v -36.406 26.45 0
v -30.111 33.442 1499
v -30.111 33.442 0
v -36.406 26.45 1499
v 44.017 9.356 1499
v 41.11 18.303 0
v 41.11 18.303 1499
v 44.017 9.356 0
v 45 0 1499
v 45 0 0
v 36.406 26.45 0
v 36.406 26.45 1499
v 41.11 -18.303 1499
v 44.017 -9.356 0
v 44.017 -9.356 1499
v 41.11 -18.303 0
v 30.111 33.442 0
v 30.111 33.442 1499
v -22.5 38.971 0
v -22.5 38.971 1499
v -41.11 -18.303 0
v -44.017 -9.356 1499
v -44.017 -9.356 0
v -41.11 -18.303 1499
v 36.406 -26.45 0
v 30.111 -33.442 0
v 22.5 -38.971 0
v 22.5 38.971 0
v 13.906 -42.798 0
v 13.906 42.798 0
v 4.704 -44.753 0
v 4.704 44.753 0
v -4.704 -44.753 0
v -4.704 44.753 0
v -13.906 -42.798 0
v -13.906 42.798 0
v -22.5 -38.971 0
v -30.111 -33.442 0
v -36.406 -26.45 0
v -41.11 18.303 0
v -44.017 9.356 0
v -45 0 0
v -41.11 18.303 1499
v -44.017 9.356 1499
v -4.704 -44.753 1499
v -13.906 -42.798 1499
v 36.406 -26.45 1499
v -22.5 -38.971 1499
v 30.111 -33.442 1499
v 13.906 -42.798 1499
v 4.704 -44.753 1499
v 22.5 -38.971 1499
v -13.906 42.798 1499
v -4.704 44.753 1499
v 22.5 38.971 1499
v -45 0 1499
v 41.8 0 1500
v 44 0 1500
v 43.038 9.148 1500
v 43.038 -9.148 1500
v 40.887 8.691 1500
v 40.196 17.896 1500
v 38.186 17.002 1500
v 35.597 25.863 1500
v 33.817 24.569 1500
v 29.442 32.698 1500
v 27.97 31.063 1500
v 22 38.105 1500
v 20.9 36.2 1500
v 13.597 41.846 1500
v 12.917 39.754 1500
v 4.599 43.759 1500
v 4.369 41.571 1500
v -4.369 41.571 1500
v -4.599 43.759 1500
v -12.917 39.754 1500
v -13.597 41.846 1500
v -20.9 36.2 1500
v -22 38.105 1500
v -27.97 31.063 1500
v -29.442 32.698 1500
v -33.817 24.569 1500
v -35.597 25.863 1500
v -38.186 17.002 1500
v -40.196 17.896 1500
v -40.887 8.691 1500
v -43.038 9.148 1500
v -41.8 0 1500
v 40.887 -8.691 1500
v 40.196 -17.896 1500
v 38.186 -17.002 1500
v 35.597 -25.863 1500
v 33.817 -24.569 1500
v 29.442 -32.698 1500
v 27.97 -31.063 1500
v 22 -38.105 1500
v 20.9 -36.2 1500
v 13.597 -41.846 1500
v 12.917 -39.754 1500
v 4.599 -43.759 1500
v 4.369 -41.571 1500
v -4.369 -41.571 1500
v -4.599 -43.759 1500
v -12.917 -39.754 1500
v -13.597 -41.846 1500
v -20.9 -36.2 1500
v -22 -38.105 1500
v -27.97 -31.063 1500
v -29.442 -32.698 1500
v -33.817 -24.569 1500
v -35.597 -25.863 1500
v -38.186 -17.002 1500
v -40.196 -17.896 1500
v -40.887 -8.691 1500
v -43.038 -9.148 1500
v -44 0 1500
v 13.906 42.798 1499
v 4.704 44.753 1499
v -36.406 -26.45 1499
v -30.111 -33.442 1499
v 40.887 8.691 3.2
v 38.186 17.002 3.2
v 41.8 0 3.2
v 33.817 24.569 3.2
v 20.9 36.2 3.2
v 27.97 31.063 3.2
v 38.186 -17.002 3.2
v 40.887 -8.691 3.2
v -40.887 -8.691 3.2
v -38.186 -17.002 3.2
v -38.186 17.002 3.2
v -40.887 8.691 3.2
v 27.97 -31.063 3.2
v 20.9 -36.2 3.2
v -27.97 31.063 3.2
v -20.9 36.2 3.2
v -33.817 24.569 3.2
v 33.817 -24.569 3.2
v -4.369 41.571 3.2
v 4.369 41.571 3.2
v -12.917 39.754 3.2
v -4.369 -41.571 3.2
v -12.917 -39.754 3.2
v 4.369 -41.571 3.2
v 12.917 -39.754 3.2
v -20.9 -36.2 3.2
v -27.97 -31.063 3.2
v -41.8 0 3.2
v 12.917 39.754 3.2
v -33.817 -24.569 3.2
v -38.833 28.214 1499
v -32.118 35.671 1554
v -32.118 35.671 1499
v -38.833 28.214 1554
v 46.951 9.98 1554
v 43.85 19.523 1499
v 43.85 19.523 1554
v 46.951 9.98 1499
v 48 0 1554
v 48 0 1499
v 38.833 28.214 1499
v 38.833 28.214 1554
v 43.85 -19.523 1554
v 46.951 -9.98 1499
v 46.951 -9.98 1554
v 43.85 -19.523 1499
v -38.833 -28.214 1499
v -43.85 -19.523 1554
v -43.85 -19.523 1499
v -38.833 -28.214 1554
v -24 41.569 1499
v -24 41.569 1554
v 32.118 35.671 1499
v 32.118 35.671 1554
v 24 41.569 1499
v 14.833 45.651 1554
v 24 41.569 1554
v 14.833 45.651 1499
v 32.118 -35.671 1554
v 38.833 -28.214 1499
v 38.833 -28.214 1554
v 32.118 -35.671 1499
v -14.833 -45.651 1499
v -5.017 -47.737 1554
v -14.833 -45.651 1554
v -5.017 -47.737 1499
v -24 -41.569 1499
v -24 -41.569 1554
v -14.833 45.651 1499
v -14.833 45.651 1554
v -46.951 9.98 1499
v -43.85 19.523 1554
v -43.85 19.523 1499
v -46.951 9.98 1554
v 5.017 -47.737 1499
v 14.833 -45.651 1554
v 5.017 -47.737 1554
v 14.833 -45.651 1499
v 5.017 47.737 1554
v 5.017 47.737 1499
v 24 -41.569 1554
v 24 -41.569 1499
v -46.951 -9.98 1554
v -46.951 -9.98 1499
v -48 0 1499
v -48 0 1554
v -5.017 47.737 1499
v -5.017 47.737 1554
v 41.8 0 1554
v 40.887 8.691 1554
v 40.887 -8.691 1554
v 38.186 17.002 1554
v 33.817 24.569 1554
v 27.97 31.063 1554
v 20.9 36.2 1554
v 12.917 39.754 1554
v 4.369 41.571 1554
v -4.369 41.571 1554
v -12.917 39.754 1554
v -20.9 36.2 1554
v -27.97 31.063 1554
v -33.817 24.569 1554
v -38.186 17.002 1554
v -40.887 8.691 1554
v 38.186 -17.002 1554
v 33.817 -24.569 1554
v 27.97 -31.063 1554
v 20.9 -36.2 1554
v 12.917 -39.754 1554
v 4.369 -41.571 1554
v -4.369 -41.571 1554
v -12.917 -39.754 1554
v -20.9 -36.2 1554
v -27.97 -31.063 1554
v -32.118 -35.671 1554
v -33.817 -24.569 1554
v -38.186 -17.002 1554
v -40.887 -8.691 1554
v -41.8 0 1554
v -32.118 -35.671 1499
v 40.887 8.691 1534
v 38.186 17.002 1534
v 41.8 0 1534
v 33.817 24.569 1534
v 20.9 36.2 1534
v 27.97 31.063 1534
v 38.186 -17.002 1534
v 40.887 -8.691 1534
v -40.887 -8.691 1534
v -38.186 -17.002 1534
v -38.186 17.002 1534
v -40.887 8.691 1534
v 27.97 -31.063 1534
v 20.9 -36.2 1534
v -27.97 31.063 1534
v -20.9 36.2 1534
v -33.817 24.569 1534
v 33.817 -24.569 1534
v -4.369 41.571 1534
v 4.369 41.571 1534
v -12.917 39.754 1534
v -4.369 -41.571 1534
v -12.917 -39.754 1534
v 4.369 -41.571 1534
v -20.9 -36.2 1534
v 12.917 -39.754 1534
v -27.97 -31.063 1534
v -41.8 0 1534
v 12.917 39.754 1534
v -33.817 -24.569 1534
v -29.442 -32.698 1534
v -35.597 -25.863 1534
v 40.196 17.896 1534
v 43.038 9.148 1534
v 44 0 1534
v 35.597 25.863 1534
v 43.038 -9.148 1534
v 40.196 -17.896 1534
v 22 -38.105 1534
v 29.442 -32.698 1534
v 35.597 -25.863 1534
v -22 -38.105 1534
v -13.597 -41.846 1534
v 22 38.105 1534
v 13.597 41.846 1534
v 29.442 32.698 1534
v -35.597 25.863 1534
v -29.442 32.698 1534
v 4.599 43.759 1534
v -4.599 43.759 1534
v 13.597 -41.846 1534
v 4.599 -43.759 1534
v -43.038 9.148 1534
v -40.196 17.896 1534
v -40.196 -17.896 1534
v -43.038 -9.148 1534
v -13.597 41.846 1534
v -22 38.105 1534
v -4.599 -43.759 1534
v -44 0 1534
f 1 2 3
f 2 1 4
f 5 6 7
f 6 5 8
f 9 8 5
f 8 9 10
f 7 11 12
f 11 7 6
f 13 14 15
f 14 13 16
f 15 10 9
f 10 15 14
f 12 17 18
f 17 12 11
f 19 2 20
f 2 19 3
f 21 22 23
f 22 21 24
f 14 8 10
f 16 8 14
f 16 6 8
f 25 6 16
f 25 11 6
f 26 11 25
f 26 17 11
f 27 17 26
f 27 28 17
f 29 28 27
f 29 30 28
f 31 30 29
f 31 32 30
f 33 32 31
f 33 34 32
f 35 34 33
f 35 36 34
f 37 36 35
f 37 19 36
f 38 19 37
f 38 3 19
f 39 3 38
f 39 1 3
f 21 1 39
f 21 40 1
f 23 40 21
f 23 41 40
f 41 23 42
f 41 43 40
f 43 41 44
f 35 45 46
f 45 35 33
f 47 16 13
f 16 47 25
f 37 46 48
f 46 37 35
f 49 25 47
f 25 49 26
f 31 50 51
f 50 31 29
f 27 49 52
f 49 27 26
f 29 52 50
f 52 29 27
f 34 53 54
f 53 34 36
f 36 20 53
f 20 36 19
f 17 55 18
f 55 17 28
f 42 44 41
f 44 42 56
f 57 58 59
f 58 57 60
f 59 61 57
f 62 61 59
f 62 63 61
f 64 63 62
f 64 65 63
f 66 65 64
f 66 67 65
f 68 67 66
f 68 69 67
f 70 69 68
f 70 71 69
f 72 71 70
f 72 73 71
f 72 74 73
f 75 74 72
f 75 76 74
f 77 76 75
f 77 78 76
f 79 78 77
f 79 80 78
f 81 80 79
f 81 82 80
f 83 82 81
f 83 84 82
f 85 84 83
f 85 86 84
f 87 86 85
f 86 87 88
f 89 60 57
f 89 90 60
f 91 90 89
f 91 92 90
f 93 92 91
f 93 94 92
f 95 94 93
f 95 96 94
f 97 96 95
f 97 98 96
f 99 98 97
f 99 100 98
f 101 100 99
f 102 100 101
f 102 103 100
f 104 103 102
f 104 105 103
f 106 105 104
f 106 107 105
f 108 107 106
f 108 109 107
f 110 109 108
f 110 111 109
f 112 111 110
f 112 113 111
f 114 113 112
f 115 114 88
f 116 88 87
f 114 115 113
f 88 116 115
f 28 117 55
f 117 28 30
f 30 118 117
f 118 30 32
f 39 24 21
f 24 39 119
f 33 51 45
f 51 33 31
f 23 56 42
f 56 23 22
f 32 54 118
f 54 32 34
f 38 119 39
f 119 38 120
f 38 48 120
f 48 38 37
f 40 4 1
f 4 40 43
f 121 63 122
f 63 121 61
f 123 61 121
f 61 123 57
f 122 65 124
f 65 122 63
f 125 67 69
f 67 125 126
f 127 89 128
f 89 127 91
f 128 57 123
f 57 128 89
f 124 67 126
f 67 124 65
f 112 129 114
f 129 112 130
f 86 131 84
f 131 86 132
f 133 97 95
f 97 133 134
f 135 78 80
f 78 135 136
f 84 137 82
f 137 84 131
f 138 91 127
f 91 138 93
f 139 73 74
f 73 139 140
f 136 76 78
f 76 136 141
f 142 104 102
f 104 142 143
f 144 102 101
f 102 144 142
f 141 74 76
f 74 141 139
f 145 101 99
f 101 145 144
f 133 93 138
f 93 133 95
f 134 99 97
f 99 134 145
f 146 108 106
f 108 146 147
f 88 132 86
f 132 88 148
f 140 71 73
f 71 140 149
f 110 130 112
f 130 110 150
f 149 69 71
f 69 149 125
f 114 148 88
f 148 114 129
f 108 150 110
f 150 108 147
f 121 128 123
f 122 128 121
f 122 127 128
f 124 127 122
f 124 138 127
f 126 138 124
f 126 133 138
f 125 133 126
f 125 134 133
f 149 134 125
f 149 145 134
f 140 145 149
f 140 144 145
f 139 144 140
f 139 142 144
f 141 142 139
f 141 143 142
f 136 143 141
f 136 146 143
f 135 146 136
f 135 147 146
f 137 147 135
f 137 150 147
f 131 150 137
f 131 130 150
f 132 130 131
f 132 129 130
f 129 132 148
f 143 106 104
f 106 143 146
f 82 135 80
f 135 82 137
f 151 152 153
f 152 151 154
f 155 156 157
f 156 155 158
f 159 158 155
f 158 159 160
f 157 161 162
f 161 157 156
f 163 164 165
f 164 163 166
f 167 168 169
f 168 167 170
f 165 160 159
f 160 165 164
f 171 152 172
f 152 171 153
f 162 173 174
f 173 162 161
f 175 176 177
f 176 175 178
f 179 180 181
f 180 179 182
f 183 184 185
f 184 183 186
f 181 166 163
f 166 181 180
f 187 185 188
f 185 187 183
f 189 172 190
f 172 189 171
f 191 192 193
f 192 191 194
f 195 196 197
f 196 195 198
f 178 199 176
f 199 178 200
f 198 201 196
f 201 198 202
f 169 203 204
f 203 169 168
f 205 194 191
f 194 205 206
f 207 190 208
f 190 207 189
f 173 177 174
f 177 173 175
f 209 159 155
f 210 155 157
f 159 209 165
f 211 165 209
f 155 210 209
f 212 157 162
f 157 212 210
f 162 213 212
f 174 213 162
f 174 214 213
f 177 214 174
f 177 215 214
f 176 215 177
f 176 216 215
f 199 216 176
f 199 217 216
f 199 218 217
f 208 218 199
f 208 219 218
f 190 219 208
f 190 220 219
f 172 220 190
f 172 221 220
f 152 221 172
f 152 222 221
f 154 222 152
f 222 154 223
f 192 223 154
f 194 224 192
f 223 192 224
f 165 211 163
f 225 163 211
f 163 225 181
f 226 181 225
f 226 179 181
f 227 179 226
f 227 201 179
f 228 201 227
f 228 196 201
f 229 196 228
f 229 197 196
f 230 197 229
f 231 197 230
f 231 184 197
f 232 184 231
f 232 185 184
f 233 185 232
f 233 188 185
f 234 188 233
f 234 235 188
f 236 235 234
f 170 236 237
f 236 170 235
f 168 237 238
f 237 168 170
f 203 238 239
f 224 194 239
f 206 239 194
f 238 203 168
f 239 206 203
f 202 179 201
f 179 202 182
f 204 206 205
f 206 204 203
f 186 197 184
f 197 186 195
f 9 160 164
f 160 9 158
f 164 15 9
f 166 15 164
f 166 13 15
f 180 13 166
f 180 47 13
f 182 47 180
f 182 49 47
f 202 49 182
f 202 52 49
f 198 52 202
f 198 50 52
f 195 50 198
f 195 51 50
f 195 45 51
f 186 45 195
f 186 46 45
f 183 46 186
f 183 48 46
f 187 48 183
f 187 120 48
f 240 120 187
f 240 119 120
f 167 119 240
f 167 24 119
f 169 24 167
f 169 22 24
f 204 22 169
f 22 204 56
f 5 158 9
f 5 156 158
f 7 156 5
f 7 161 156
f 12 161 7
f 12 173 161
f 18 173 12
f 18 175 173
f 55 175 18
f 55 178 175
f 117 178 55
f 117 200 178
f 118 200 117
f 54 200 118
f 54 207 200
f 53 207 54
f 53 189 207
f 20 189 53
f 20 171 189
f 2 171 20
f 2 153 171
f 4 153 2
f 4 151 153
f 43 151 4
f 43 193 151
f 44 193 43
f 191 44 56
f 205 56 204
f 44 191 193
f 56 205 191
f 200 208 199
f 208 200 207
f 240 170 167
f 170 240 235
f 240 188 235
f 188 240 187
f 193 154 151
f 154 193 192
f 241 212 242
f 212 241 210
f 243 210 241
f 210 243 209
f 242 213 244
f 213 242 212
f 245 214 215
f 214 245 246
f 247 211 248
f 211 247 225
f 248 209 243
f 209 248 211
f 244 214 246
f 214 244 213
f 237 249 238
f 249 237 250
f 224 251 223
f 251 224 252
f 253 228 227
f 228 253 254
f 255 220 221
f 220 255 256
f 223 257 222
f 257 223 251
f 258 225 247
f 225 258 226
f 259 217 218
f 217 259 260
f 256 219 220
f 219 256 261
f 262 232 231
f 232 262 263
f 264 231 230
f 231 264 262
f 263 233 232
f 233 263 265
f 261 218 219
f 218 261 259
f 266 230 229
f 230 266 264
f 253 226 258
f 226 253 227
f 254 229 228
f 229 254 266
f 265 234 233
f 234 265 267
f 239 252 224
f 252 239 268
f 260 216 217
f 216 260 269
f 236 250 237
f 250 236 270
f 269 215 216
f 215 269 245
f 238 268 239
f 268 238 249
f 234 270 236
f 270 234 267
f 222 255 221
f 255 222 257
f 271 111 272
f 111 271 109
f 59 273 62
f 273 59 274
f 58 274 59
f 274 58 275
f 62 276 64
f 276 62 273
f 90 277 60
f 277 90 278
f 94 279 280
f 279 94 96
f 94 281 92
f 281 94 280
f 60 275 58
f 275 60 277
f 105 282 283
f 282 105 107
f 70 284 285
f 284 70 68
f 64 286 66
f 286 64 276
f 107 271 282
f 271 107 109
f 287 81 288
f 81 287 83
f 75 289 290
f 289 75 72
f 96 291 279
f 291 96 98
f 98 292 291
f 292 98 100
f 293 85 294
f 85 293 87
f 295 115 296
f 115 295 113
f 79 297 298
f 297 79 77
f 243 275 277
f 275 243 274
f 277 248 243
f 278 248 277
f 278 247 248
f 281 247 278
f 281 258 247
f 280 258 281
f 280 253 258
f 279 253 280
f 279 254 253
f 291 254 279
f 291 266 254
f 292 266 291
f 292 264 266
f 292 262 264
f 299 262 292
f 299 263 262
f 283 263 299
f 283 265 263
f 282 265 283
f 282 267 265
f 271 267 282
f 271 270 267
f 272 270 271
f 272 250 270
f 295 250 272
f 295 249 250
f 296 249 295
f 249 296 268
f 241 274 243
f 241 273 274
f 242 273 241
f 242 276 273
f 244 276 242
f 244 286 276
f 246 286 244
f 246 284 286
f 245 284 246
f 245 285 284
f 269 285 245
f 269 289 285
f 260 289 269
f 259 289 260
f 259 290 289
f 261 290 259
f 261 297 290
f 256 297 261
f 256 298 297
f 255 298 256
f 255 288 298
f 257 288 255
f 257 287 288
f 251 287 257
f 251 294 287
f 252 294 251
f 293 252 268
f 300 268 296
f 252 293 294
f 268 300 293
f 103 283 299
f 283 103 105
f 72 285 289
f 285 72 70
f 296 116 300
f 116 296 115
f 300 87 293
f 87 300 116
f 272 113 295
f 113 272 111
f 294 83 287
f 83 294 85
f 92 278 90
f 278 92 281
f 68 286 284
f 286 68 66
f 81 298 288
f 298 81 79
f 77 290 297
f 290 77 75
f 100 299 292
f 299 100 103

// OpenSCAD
// Parameters
pipe_standard = 1; //[1:1:1]
nominal_diameter = 90; //[45:180:1]
length_mm = 1500; //[750:3000:10]
pipe_wall = 3.2; //[1.6:6.4:0.1]
fitting_height = 55; //[30:110:1]
fitting_over_od = 6; //[3:12:0.5]
fitting_wall = 4; //[2:8:0.5]
socket_depth = 35; //[15:70:1]
overlap = 1; //[0.5:2:0.1]

// HT Pipe Body
module ht_pipe_body() {
  difference() {
    cylinder(h=length_mm, r=nominal_diameter/2, center=false);
    translate([0, 0, pipe_wall])
      cylinder(h=length_mm, r=nominal_diameter/2 - pipe_wall, center=false);
  }
}

// End Fitting
module end_fitting() {
  difference() {
    cylinder(h=fitting_height, r=nominal_diameter/2 + fitting_over_od/2, center=false);
    translate([0, 0, 0])
      cylinder(h=fitting_height, r=nominal_diameter/2 - pipe_wall, center=false);
    translate([0, 0, 0])
      cylinder(h=socket_depth, r=nominal_diameter/2 + fitting_over_od/2 - fitting_wall, center=false);
  }
}

// HT Pipe - Complete Geometry
module ht_pipe() {
  color([0.85, 0.85, 0.8]) { // PVC color
    union() {
      translate([0, 0, 0]) ht_pipe_body();
      translate([0, 0, length_mm - overlap]) end_fitting();
    }
  }
}

// Assembly
module assembly() {
  ht_pipe();
}

assembly();
